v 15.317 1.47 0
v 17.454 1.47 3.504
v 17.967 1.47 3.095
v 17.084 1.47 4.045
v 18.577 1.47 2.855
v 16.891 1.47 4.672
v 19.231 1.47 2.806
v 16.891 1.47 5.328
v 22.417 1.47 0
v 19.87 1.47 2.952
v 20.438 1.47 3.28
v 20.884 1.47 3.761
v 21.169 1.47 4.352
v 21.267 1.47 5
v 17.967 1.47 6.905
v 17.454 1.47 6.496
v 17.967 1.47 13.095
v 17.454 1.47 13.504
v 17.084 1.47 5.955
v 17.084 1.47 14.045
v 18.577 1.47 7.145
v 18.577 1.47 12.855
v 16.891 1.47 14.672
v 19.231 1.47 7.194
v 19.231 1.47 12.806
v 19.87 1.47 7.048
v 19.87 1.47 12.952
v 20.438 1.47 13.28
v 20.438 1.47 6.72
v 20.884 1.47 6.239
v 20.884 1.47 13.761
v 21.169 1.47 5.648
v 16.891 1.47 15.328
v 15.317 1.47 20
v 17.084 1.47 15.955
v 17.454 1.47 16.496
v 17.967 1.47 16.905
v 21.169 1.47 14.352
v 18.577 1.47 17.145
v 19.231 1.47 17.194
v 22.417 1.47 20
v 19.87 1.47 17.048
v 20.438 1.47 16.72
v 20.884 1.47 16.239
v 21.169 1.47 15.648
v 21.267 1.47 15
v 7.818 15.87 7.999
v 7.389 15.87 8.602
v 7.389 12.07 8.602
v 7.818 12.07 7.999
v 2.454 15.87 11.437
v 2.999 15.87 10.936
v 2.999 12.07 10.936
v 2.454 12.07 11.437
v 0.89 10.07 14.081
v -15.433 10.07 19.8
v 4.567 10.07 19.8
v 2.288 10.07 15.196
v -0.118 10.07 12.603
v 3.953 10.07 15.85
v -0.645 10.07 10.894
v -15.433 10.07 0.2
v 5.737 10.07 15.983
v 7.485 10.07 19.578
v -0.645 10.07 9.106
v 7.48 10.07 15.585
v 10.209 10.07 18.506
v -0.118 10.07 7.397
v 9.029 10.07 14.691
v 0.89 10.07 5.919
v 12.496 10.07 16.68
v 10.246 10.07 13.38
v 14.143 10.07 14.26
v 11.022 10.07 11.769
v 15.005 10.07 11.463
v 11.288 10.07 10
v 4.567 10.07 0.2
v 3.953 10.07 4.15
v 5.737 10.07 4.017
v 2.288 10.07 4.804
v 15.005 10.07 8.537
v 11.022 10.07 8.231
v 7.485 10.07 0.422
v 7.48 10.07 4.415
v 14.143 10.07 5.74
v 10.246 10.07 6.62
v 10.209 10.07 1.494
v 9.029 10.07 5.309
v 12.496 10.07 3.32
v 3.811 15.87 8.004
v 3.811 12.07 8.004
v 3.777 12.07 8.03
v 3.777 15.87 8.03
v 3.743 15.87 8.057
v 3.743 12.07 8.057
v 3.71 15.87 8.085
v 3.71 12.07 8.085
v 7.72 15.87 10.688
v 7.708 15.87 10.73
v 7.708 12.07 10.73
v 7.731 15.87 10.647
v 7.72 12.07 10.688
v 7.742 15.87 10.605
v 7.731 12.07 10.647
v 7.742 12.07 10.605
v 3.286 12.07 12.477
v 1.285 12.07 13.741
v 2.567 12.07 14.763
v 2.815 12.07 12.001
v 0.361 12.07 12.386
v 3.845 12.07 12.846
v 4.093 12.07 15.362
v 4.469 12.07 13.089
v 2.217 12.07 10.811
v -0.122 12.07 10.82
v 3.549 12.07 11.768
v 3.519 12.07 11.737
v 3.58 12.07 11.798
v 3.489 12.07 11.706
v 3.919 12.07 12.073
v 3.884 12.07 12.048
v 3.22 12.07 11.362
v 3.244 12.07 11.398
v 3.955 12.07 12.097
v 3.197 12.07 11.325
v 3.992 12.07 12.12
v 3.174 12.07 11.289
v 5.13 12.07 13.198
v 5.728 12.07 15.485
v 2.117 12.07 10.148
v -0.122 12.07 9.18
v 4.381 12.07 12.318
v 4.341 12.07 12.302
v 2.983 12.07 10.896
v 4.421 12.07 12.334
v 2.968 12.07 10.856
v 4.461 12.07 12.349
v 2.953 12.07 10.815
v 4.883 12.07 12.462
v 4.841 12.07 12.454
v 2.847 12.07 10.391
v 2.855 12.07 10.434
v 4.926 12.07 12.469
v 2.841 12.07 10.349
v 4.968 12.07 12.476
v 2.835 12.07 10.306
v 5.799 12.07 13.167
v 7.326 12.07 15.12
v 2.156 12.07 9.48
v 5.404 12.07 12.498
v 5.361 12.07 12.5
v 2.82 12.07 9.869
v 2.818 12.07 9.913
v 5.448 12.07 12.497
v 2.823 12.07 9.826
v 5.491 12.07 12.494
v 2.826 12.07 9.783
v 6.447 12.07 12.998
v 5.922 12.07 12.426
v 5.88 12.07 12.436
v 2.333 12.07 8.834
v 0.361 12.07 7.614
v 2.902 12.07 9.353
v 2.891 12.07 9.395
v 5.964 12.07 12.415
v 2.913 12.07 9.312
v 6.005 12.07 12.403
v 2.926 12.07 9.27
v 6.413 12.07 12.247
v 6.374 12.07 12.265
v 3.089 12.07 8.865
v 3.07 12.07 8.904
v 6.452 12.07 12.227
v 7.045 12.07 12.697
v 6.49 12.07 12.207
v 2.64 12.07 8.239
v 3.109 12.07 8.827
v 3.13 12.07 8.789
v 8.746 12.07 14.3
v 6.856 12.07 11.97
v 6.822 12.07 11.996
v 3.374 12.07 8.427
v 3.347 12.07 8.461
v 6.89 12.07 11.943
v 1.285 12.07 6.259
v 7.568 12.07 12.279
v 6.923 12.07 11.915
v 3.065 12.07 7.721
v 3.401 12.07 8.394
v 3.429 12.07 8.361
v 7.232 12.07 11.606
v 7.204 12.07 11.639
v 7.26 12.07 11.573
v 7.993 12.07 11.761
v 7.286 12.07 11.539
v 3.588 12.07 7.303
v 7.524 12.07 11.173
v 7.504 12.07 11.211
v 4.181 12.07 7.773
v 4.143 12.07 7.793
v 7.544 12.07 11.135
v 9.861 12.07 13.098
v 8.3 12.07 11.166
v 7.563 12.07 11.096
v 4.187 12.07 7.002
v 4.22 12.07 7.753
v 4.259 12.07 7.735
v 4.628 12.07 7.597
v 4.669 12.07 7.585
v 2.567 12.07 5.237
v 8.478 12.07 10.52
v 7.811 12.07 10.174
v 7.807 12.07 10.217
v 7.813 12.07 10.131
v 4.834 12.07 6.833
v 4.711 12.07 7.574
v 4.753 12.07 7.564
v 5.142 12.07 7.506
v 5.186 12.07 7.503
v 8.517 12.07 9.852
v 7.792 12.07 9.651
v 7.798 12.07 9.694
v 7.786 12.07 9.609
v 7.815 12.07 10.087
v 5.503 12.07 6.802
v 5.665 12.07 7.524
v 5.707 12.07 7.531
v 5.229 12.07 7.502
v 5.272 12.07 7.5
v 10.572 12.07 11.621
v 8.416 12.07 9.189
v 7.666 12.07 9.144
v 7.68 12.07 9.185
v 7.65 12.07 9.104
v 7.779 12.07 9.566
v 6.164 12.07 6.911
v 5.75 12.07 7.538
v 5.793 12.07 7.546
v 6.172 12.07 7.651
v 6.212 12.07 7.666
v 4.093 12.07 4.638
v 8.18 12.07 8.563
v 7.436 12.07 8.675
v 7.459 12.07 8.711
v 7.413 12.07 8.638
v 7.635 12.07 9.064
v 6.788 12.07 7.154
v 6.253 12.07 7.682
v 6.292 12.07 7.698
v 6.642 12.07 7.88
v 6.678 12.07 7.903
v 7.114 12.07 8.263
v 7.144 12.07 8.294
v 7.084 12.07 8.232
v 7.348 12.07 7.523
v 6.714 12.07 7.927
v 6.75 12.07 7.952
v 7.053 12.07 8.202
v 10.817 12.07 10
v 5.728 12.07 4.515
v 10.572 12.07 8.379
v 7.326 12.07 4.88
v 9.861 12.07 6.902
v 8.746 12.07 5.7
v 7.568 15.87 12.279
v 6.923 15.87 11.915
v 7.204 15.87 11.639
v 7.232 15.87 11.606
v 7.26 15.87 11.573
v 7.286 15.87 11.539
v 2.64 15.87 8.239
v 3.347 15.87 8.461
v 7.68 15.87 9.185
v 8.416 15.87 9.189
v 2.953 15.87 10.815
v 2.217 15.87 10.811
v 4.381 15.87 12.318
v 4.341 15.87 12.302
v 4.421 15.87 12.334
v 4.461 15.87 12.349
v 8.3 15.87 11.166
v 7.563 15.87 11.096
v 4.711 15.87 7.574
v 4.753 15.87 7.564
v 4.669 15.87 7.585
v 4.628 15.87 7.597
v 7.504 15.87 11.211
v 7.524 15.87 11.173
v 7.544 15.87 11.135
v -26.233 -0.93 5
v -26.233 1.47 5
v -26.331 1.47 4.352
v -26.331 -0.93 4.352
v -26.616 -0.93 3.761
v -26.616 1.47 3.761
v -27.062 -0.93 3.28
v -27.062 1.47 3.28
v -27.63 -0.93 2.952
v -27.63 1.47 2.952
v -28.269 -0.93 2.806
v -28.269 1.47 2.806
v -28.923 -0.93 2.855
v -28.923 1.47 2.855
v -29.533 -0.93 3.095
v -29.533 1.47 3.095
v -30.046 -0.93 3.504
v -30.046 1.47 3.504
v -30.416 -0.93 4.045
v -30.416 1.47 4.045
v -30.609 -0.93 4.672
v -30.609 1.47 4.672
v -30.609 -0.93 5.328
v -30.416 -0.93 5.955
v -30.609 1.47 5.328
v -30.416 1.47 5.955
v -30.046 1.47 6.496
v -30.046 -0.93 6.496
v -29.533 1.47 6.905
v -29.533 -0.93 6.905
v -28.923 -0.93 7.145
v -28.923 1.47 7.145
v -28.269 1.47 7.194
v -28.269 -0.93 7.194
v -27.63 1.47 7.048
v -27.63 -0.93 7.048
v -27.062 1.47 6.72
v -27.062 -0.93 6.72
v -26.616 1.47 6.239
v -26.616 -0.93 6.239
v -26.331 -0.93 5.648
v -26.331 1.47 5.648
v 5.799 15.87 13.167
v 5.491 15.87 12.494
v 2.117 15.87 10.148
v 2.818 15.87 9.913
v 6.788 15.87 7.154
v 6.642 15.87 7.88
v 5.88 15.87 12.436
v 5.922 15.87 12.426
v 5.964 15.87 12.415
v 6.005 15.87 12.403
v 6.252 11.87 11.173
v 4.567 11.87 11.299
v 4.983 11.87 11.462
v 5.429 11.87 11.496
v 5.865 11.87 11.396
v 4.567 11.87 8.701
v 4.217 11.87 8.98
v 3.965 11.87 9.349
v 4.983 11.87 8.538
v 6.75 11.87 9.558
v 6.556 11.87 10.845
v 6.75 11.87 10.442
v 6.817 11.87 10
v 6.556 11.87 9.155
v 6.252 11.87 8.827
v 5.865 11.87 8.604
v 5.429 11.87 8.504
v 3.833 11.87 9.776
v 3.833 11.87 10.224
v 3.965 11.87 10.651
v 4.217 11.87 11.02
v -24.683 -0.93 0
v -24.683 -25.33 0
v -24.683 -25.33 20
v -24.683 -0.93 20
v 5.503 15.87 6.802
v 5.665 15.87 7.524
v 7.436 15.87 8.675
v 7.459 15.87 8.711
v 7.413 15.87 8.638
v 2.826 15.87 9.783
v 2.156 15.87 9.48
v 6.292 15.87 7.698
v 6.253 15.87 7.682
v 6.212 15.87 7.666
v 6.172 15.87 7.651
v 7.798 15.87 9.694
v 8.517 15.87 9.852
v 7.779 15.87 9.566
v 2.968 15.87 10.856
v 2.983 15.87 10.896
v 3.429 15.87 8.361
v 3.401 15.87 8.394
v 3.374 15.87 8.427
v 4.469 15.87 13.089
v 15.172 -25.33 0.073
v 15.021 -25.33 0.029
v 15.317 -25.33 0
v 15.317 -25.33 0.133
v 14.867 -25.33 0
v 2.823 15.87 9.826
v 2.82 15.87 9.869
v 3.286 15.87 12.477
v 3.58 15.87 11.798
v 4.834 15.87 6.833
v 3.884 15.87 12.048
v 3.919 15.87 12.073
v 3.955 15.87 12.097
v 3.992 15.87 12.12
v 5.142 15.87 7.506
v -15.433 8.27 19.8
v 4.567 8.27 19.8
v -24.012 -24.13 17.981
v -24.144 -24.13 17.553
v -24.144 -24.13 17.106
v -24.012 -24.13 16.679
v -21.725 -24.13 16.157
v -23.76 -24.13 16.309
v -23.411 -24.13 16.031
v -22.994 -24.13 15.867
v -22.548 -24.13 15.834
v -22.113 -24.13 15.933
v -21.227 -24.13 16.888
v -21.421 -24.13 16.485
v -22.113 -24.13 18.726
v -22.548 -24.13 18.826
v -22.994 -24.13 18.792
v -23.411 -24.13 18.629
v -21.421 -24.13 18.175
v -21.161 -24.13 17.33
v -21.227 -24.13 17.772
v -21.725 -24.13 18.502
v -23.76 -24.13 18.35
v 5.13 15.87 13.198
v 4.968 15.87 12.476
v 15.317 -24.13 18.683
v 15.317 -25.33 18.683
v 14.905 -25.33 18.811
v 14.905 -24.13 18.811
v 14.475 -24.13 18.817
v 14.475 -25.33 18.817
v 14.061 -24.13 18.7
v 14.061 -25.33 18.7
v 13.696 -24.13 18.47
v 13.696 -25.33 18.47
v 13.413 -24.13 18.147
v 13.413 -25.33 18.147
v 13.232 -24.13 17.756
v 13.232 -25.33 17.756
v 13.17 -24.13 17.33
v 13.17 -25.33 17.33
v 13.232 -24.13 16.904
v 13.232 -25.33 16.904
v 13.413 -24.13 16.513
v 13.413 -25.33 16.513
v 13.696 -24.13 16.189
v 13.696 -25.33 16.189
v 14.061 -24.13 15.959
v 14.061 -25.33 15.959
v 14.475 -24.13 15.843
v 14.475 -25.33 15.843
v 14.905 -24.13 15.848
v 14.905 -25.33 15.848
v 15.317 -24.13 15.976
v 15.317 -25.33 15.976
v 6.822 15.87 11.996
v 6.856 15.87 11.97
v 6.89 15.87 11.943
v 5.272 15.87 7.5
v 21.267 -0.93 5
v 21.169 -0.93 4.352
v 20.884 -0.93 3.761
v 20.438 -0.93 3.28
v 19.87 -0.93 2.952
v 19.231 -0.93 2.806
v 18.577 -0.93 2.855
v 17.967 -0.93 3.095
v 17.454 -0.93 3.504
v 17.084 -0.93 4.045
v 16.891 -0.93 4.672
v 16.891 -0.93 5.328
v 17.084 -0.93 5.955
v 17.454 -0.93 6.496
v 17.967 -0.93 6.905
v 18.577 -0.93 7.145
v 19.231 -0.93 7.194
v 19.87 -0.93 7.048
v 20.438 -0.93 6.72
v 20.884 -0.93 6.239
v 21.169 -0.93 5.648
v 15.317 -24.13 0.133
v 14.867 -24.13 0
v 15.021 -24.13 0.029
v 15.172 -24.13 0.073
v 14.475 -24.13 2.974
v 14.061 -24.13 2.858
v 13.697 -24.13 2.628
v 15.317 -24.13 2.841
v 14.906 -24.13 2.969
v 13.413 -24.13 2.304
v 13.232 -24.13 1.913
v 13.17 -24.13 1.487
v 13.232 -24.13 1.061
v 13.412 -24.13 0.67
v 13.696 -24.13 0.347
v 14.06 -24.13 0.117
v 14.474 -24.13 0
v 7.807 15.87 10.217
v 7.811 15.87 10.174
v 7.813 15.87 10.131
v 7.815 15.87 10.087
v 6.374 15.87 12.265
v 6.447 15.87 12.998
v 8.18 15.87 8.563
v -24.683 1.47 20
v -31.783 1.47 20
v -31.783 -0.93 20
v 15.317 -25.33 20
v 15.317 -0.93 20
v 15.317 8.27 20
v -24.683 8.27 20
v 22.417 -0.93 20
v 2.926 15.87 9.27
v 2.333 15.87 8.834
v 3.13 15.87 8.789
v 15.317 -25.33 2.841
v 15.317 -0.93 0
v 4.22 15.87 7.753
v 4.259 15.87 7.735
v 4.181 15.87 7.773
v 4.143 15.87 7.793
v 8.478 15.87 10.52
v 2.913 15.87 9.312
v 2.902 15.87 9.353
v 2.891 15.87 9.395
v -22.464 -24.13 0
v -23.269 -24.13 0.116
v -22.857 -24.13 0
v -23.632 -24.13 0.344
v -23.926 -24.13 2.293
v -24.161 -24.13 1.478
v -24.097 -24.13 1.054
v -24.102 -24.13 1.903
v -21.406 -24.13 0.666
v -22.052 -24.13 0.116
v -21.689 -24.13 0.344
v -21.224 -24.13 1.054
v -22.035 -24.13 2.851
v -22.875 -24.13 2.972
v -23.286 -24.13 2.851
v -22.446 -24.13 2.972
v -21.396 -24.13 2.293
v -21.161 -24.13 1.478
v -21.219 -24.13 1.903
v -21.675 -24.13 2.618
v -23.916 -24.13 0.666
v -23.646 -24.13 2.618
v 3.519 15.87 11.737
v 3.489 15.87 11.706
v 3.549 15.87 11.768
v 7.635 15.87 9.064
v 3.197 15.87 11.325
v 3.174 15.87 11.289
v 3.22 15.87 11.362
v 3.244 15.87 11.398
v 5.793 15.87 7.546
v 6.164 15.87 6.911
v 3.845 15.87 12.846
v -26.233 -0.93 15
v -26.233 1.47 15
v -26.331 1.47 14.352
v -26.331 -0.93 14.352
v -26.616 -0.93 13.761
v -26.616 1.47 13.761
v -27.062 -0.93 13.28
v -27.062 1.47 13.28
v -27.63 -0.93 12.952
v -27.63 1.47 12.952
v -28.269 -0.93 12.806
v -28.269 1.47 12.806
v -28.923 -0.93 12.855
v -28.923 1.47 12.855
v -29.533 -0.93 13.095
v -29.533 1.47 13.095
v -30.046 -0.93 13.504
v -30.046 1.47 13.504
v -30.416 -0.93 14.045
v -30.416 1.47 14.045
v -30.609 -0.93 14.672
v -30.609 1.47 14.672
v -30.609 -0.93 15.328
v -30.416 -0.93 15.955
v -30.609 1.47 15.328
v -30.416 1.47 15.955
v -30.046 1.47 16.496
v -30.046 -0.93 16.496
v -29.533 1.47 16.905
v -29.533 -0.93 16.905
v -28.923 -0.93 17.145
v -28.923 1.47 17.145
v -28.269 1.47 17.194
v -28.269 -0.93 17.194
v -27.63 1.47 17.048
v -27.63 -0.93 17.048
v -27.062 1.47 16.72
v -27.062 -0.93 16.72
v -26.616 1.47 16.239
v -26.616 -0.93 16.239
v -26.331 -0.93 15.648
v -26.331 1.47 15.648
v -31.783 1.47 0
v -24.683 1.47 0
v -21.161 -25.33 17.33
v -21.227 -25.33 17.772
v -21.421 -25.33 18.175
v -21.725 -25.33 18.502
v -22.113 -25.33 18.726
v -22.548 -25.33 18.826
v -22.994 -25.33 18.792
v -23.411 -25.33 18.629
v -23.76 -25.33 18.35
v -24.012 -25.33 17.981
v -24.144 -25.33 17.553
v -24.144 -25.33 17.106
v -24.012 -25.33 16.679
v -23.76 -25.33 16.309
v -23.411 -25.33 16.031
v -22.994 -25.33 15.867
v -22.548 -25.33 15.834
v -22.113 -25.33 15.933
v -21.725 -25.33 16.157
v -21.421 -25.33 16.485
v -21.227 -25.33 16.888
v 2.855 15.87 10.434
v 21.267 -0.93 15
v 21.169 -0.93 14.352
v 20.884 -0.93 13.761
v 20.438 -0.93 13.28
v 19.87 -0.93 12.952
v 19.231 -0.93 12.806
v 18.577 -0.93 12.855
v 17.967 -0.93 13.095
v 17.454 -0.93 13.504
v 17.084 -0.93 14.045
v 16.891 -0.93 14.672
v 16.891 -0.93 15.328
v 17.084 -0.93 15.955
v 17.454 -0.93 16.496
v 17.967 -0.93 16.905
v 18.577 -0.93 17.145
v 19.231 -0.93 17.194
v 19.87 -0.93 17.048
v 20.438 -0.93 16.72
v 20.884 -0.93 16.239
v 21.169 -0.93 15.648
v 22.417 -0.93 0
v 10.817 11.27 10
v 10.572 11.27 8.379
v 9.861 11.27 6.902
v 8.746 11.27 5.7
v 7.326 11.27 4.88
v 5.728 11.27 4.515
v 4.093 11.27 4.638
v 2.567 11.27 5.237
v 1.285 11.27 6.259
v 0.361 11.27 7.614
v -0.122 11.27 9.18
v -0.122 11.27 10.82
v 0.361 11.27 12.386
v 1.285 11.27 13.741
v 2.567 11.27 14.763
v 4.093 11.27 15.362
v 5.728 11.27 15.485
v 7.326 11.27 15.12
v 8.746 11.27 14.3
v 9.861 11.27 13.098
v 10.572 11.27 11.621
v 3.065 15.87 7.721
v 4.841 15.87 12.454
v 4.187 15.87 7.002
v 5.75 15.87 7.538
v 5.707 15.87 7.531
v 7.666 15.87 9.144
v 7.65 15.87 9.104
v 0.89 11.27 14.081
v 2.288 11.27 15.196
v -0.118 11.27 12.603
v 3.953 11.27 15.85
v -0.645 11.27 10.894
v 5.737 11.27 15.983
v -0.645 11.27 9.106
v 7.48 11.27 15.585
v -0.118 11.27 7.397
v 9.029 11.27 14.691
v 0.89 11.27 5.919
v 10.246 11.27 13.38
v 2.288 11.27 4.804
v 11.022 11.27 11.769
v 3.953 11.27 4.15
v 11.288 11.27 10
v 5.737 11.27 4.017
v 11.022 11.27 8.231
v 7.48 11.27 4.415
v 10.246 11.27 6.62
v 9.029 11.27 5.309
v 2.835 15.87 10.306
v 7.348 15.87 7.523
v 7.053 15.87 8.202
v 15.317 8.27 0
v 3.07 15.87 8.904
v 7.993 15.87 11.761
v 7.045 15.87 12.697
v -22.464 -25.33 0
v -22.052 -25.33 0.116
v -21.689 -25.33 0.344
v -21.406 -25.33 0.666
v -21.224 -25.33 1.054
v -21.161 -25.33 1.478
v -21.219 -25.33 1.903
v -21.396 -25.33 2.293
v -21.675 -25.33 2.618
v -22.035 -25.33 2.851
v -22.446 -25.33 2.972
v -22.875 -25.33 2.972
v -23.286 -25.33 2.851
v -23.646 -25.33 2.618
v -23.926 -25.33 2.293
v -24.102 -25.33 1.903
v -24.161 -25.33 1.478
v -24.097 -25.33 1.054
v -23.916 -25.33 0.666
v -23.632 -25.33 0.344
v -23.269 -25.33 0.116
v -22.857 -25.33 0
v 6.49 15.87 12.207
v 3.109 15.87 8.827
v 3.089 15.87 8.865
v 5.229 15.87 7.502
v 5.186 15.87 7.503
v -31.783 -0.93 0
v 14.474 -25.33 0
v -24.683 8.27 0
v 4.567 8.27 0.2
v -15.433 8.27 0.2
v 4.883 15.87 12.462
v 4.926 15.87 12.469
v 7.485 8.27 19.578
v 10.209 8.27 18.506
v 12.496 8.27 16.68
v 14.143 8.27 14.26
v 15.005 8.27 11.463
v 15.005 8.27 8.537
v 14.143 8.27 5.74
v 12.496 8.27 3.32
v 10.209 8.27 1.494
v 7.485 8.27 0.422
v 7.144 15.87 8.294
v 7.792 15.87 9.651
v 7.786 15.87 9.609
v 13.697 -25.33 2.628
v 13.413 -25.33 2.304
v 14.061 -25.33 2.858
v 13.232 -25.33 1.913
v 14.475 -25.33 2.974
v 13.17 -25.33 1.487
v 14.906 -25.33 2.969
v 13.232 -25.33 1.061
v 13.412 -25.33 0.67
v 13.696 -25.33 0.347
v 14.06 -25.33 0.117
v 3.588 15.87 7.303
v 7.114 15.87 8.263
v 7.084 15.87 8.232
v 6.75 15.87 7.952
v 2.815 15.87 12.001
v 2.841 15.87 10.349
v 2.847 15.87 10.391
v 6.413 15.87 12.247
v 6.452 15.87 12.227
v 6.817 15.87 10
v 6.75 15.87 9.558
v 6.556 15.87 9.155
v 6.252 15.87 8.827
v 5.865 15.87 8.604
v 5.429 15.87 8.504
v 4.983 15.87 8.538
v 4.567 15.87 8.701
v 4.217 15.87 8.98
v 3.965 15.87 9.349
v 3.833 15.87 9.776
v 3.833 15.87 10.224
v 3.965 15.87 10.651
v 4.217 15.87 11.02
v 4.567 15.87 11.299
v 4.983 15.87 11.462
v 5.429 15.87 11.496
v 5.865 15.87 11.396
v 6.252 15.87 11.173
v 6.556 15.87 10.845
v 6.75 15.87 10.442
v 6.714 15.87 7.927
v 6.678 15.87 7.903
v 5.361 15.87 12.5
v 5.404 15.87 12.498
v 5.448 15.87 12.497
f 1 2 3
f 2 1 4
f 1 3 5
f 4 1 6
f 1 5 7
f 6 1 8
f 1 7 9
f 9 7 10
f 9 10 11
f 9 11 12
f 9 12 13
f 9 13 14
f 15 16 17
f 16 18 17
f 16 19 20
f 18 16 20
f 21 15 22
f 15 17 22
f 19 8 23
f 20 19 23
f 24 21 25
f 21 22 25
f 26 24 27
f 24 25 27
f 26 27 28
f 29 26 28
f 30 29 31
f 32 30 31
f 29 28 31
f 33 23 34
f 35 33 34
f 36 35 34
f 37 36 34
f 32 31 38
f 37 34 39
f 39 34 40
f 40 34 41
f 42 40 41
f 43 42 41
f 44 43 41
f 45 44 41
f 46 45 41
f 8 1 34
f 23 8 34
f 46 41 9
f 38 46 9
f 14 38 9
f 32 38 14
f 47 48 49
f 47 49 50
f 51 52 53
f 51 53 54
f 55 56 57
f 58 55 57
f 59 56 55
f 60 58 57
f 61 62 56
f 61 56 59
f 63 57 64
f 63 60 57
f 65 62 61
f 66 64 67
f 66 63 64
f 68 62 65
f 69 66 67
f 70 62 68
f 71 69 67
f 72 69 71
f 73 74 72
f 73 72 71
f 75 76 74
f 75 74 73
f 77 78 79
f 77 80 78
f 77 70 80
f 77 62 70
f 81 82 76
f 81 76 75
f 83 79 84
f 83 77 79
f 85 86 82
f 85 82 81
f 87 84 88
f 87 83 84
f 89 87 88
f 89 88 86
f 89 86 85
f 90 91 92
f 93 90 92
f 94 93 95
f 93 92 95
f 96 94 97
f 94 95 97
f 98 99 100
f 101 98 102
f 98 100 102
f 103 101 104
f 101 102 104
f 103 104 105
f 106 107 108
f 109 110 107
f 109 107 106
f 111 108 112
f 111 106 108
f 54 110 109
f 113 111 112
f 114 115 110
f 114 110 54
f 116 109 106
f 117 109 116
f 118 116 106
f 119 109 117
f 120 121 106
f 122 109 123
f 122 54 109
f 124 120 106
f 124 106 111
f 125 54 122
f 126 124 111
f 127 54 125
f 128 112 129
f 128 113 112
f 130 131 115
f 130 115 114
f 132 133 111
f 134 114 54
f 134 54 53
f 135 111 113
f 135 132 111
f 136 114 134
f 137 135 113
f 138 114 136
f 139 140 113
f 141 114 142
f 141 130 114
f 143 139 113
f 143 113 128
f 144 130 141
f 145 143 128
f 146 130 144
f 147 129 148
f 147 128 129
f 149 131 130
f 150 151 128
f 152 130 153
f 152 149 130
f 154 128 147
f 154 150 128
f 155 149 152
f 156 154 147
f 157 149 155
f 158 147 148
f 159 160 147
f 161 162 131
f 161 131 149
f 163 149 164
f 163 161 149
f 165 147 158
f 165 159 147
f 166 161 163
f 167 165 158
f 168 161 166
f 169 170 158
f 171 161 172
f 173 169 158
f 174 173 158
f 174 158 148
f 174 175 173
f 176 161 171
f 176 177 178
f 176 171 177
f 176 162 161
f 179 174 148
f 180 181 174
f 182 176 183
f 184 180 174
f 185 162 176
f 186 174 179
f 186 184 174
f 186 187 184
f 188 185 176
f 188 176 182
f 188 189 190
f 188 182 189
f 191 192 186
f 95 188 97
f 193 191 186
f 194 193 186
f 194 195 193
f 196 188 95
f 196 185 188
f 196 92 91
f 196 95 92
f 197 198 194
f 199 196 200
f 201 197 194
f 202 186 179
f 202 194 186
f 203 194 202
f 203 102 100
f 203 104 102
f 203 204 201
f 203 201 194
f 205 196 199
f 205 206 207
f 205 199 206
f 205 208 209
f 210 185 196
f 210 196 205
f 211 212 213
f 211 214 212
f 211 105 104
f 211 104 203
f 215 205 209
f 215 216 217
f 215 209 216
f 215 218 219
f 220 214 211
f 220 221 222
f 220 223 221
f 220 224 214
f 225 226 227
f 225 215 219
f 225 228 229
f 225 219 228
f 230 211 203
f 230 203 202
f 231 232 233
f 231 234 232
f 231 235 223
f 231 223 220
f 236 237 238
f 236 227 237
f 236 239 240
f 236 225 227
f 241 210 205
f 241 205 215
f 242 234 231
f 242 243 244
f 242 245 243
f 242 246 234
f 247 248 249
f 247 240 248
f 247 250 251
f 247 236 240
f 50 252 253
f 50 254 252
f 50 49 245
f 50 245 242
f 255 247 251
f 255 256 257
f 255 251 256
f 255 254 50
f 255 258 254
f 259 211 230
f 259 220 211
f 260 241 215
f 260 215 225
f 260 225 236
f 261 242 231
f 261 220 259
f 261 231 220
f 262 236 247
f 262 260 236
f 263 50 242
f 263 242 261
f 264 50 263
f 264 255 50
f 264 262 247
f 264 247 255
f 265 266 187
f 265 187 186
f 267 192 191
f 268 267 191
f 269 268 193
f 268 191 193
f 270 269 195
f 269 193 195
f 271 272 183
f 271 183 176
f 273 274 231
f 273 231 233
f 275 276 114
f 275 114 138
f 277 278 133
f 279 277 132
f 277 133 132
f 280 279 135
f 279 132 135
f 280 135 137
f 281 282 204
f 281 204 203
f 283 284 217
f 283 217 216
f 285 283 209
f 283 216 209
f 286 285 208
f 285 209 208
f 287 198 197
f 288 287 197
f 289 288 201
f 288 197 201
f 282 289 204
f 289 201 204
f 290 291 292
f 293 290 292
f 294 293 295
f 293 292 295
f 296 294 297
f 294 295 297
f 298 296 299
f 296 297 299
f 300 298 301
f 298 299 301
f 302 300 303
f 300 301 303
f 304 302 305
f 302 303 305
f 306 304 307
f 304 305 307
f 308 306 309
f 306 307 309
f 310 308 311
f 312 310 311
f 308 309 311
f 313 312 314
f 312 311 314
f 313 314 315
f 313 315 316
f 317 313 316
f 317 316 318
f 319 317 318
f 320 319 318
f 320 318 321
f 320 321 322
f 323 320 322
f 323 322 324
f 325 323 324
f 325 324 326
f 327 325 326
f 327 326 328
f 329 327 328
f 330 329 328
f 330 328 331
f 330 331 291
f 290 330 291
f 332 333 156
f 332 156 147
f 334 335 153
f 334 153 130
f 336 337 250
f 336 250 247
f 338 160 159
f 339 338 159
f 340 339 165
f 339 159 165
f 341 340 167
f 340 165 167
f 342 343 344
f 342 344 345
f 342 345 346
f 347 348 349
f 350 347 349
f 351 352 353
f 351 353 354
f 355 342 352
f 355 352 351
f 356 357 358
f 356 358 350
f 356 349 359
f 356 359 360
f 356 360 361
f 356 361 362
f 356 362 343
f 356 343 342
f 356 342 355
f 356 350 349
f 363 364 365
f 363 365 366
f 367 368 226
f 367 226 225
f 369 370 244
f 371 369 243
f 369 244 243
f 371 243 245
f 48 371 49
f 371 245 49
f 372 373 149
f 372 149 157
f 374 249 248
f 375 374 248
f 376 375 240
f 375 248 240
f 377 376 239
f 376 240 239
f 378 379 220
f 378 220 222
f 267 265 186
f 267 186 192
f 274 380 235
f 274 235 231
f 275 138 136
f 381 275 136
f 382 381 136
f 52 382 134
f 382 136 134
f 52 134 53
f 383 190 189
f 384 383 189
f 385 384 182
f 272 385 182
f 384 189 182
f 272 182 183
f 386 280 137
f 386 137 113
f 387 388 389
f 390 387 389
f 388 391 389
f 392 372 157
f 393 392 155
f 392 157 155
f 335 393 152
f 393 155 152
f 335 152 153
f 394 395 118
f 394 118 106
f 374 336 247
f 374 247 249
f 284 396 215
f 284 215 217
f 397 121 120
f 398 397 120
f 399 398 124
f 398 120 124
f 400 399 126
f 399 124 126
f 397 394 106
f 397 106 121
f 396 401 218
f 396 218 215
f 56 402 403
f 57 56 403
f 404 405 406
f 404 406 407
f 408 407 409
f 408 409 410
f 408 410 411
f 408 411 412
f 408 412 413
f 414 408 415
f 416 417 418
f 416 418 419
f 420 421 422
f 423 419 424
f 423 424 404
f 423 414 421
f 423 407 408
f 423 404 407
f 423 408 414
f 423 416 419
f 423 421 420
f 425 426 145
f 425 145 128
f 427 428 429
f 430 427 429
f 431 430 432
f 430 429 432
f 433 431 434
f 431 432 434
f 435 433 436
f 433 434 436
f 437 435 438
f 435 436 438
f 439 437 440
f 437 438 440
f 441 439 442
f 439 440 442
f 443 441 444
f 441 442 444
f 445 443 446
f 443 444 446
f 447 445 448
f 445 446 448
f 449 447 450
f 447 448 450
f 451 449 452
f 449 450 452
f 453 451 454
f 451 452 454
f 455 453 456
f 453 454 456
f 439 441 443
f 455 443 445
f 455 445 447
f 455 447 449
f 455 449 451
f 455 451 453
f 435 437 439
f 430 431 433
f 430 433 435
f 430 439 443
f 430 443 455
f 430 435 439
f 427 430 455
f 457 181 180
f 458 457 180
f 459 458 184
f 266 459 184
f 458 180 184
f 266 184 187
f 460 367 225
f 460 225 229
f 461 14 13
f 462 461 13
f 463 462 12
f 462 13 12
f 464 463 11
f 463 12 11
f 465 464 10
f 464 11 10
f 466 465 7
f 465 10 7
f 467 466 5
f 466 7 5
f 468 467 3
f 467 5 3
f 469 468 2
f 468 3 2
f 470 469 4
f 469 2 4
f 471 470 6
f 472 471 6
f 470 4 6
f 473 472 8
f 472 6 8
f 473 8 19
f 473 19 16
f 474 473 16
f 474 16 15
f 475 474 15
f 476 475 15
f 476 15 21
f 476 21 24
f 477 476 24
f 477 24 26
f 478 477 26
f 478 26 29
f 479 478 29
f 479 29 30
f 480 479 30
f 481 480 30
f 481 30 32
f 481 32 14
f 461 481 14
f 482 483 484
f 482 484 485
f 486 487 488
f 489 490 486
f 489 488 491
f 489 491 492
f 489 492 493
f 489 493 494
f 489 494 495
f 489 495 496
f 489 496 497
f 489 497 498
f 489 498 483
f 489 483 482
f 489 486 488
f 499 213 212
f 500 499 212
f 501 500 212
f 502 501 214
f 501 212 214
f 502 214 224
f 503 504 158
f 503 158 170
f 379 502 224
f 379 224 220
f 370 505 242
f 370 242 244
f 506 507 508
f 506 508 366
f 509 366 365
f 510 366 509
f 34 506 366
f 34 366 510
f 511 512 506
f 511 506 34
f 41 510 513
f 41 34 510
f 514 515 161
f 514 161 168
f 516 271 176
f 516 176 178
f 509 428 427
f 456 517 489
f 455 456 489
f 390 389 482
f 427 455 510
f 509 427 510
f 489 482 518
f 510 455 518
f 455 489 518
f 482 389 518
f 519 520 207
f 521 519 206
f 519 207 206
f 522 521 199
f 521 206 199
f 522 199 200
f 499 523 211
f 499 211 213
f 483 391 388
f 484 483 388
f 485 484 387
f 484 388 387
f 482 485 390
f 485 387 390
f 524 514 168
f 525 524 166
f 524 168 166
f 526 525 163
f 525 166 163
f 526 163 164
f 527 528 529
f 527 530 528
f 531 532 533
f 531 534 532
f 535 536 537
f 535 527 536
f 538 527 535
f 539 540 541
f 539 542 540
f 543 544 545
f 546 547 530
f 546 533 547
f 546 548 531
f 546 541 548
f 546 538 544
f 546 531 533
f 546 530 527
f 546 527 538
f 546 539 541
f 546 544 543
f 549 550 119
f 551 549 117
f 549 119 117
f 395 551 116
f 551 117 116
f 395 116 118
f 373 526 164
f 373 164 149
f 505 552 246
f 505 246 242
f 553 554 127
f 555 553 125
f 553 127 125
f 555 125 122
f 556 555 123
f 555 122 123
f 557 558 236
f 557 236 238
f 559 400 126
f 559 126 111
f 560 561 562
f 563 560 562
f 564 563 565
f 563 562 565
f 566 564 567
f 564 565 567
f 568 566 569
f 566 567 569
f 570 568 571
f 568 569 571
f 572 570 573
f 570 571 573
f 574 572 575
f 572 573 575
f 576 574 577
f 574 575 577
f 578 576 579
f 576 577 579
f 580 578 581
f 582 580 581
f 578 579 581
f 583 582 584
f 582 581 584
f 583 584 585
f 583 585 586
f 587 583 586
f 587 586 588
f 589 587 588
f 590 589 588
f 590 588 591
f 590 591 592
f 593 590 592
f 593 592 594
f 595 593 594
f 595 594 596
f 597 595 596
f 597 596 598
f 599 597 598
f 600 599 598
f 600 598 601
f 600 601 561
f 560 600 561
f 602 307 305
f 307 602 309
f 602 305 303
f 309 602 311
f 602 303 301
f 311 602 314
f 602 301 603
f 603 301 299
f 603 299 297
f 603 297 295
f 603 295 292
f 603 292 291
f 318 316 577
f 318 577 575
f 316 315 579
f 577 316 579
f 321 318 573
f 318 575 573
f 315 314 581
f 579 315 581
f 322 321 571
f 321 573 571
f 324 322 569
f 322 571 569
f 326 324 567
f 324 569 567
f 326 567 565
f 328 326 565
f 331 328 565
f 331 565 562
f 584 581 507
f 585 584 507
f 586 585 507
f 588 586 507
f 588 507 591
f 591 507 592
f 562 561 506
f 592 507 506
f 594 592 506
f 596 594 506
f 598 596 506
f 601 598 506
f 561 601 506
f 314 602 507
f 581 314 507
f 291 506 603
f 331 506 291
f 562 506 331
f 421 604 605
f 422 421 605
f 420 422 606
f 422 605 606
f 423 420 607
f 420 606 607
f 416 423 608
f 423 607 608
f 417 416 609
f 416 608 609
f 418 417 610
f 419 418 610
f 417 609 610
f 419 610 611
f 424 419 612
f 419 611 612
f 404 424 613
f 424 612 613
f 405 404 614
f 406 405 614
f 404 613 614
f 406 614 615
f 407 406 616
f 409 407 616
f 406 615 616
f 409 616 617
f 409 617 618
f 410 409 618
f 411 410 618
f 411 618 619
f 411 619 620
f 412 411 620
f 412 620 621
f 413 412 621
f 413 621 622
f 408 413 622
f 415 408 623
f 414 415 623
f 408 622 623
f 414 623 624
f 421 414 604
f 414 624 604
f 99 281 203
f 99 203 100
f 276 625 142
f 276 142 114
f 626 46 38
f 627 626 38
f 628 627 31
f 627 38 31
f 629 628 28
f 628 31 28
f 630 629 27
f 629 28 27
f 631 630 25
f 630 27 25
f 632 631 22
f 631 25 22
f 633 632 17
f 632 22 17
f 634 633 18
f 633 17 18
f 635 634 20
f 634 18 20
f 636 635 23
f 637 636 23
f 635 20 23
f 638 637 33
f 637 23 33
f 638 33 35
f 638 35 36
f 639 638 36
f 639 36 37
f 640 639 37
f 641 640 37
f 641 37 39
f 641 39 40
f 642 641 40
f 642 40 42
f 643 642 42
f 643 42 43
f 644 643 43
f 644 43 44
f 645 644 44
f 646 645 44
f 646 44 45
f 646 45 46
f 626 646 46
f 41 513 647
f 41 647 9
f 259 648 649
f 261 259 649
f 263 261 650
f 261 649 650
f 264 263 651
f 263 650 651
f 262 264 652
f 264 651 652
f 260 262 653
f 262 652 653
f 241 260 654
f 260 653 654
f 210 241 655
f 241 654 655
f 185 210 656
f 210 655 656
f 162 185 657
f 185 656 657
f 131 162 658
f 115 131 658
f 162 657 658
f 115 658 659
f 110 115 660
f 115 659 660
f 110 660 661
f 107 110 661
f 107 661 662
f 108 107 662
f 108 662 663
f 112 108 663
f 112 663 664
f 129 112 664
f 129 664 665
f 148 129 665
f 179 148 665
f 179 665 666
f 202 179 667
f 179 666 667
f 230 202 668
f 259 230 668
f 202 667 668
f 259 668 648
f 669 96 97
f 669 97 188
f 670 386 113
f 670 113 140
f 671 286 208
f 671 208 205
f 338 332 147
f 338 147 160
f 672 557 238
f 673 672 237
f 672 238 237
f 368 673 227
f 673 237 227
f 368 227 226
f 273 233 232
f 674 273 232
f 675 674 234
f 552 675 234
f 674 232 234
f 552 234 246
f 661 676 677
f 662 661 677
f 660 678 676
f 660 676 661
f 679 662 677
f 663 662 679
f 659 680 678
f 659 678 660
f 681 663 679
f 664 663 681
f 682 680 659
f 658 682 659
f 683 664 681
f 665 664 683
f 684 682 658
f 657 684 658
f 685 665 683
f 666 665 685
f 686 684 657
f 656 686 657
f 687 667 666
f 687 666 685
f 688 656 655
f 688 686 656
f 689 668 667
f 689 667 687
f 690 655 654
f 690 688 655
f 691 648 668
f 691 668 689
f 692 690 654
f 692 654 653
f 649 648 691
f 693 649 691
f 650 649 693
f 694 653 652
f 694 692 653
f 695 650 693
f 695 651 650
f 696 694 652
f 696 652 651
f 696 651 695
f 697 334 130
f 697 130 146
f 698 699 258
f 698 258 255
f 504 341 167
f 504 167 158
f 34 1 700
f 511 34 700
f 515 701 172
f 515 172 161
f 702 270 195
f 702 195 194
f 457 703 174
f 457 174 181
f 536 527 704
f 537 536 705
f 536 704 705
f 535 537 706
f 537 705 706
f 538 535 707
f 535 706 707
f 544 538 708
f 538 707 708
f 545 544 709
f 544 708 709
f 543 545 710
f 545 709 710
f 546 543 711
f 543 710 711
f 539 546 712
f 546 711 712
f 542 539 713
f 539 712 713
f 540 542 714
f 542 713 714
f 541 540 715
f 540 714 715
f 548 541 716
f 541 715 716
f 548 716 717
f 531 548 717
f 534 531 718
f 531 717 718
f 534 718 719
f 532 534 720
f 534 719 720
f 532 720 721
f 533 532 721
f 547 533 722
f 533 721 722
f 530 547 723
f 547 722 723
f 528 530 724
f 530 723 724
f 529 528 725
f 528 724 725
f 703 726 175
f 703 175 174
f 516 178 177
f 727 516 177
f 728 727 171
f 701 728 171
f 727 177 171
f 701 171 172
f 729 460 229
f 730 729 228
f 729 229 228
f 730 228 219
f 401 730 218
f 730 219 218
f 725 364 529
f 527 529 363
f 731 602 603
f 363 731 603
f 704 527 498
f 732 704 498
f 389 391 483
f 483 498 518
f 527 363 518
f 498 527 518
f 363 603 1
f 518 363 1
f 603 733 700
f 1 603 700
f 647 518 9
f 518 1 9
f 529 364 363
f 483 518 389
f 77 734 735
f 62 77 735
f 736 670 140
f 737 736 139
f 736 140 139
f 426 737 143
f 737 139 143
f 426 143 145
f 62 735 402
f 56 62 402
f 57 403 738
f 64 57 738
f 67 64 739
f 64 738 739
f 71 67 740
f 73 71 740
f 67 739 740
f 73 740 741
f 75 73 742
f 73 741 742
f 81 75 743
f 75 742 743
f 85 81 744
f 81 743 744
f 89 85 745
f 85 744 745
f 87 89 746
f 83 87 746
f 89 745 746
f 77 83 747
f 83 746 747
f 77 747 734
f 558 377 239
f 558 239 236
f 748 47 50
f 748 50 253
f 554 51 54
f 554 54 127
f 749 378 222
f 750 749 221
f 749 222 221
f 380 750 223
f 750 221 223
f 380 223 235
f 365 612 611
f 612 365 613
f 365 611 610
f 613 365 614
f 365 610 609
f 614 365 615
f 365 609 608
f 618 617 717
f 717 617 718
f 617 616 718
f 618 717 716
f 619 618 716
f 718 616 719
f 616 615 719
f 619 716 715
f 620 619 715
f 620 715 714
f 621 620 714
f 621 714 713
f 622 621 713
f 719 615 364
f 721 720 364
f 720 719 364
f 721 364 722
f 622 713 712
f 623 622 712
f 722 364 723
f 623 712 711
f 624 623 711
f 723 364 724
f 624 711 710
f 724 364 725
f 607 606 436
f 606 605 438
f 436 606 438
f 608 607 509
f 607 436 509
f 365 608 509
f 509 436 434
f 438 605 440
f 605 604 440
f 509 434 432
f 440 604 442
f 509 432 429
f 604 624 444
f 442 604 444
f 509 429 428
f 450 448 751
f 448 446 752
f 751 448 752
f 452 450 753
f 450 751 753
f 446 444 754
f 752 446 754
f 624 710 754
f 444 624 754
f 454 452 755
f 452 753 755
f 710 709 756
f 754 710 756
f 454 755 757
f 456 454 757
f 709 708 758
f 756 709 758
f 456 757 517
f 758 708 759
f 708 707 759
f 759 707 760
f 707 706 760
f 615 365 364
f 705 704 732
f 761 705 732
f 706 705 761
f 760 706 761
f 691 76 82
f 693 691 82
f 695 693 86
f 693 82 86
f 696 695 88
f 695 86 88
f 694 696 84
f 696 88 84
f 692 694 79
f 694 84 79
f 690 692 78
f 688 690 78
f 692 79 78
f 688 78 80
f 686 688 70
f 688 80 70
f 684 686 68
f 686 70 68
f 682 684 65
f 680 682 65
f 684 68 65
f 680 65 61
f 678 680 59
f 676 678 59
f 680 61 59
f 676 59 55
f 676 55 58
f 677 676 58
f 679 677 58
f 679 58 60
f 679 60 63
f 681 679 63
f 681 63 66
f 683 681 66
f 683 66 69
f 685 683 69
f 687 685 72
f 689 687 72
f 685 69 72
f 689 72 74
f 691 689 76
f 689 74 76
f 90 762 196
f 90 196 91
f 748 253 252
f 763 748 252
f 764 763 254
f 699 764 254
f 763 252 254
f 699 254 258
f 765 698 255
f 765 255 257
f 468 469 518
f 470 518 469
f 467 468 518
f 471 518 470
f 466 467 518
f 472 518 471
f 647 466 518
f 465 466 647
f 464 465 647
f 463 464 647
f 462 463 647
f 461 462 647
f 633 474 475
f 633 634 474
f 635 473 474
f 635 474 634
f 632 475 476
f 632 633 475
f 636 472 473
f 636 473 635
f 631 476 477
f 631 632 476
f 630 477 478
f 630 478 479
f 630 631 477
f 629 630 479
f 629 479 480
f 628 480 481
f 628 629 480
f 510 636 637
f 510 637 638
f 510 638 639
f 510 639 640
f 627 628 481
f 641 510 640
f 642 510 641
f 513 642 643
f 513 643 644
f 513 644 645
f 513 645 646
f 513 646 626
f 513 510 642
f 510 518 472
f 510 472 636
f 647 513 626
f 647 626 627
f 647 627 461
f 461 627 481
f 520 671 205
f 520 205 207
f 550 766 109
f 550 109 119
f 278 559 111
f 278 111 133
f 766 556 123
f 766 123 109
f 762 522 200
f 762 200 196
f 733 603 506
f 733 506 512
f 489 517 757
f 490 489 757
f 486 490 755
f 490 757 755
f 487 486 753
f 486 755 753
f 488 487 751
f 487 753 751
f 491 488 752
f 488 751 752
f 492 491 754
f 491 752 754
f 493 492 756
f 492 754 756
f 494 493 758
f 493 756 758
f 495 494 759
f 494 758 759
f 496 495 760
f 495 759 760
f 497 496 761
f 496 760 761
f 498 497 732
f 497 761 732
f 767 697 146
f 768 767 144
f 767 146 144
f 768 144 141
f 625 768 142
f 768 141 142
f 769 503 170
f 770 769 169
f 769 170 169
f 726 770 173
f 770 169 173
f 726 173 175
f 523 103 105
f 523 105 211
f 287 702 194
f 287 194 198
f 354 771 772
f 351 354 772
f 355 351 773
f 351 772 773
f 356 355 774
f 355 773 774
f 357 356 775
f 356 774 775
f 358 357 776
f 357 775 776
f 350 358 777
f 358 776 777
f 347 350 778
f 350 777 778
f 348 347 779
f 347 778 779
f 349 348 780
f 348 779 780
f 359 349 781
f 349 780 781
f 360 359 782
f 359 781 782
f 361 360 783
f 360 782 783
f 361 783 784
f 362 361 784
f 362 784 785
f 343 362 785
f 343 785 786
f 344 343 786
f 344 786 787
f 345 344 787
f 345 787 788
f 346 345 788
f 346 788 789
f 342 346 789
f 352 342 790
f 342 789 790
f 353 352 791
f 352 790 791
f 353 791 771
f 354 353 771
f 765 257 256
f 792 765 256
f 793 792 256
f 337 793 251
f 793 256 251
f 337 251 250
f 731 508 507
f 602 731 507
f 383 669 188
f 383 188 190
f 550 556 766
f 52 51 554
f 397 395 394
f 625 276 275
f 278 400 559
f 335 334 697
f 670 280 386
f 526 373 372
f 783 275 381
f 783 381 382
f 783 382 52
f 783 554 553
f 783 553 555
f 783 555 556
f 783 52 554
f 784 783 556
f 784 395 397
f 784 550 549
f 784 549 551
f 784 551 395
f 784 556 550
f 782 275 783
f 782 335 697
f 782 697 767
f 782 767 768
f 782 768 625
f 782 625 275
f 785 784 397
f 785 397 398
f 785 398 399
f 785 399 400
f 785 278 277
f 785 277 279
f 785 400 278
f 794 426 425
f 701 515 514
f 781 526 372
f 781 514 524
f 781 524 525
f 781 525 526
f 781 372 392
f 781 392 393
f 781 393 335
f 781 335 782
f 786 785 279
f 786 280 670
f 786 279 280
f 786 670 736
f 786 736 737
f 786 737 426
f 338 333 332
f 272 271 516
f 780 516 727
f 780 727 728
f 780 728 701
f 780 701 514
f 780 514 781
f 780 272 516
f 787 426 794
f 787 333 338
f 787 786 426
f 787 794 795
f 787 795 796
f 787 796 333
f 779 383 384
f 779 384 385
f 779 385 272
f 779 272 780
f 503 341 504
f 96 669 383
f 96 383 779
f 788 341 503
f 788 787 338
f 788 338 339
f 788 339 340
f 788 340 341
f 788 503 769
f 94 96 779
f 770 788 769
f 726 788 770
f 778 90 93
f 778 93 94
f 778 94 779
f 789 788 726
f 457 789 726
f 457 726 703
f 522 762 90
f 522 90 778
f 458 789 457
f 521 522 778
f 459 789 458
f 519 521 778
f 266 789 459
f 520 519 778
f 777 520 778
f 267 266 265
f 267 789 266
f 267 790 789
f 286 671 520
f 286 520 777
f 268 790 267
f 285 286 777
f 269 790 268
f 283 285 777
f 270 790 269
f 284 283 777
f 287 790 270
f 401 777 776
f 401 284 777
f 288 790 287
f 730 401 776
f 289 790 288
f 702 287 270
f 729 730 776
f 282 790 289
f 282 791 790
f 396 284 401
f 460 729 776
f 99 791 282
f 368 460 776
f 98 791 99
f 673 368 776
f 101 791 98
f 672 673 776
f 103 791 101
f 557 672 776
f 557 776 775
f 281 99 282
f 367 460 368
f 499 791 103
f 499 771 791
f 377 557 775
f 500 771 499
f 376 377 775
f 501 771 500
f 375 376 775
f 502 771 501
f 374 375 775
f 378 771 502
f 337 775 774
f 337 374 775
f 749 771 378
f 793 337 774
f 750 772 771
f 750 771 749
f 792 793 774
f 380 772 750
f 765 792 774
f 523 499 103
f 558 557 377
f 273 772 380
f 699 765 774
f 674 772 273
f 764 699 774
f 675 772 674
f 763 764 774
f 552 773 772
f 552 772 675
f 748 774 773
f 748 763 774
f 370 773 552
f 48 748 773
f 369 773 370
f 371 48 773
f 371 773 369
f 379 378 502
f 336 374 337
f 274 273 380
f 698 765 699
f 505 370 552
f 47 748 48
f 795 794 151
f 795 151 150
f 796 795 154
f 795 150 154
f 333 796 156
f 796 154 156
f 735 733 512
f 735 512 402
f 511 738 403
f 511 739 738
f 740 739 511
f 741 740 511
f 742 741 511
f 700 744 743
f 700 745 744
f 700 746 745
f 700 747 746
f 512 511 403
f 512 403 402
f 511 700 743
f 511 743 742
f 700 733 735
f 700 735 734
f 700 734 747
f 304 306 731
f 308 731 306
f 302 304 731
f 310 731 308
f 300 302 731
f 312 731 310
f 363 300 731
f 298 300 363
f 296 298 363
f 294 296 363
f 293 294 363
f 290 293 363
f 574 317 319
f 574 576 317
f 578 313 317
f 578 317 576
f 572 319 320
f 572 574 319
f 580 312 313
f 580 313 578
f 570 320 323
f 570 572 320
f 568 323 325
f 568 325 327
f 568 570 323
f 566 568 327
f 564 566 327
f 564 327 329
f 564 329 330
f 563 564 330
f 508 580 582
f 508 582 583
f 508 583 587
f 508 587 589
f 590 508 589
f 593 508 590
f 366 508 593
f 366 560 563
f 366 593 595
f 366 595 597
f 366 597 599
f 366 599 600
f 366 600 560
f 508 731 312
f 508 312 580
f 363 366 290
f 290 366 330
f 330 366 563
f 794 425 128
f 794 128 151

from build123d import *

# Parameters (mm, degrees)
SKETCH1_W           = 40
SKETCH1_H           = 33.6
BOSS_EXTRUDE1_DEPTH = 20
SKETCH2_W           = 7.1
SKETCH2_H           = 2.4
BOSS_EXTRUDE2_DEPTH = 20
SKETCH4_R           = 2.2
CUT_EXTRUDE1_DEPTH  = 3
BOSS_EXTRUDE4_DEPTH = 1.8
SKETCH6_R           = 1.5
CUT_EXTRUDE2_DEPTH  = 1.2
SKETCH7_R           = 6
BOSS_EXTRUDE5_DEPTH = 1.2
SKETCH8_R           = 5.5
BOSS_EXTRUDE6_DEPTH = 0.8
SKETCH10_R          = 2.5
BOSS_EXTRUDE8_DEPTH = 3.8
BOSS_EXTRUDE9_DEPTH = 4
CIRPATTERN2_COUNT   = 30
SKETCH12_R          = 1.5
CUT_EXTRUDE4_DEPTH  = 4


with BuildPart() as part:
    # Sketch1 → Boss-Extrude1 (new body)
    with BuildSketch(Plane.XY):
        with Locations((-4.683412042, -8.529571984)):
            Rectangle(SKETCH1_W, SKETCH1_H)
    extrude(amount=BOSS_EXTRUDE1_DEPTH)

    # Sketch2 → Boss-Extrude2 (add)
    with BuildSketch(Plane.XY.offset(20)):
        with Locations((18.866587958, 0.270428016)):
            Rectangle(SKETCH2_W, SKETCH2_H)
        with Locations((-28.233412042, 0.270428016)):
            Rectangle(SKETCH2_W, SKETCH2_H)
    extrude(amount=-BOSS_EXTRUDE2_DEPTH)

    # Sketch4 → Cut-Extrude1 (cut)
    with BuildSketch(Plane(origin=(0, 1.470428016, 0), x_dir=(1, 0, 0), z_dir=(0, 1, 0))):
        with Locations((19.066587958, -15)):
            Circle(SKETCH4_R)
        with Locations((19.066587958, -5)):
            Circle(SKETCH4_R)
        with Locations((-28.433412042, -15)):
            Circle(SKETCH4_R)
        with Locations((-28.433412042, -5)):
            Circle(SKETCH4_R)
    extrude(amount=-CUT_EXTRUDE1_DEPTH, mode=Mode.SUBTRACT)

    # Sketch5 → Boss-Extrude4 (add)
    with BuildSketch(Plane(origin=(0, 8.270428016, 0), x_dir=(1, 0, 0), z_dir=(0, 1, 0))):
        with BuildLine():
            Line((-15.433412042, -0.2), (-15.433412042, -19.8))
            Line((-15.433412042, -19.8), (4.566587958, -19.8))
            ThreePointArc((4.566587958, -19.8), (15.11483144, -10), (4.566587958, -0.2))
            Line((4.566587958, -0.2), (-15.433412042, -0.2))
        make_face()
    extrude(amount=BOSS_EXTRUDE4_DEPTH)

    # Sketch6 → Cut-Extrude2 (cut)
    with BuildSketch(Plane.XZ.offset(25.329571984)):
        with Locations((-22.660585011, 17.329722527)):
            Circle(SKETCH6_R)
        with Locations((-22.660585011, 1.487126069)):
            Circle(SKETCH6_R)
        with Locations((14.670467636, 17.329722527)):
            Circle(SKETCH6_R)
        with Locations((14.670467636, 1.487126069)):
            Circle(SKETCH6_R)
    extrude(amount=-CUT_EXTRUDE2_DEPTH, mode=Mode.SUBTRACT)

    # Sketch7 → Boss-Extrude5 (add)
    with BuildSketch(Plane(origin=(0, 10.070428016, 0), x_dir=(1, 0, 0), z_dir=(0, 1, 0))):
        with Locations((5.288292978, -10)):
            Circle(SKETCH7_R)
    extrude(amount=BOSS_EXTRUDE5_DEPTH)

    # Sketch8 → Boss-Extrude6 (add)
    with BuildSketch(Plane(origin=(0, 11.270428016, 0), x_dir=(1, 0, 0), z_dir=(0, 1, 0))):
        with Locations((5.316587958, -10)):
            Circle(SKETCH8_R)
    extrude(amount=BOSS_EXTRUDE6_DEPTH)

    # Sketch10 → Boss-Extrude8 (add)
    with BuildSketch(Plane(origin=(0, 12.070428016, 0), x_dir=(1, 0, 0), z_dir=(0, 1, 0))):
        with Locations((5.316587958, -10)):
            Circle(SKETCH10_R)
    extrude(amount=BOSS_EXTRUDE8_DEPTH)

    # Sketch11 → Boss-Extrude9 (add)
    with BuildSketch(Plane(origin=(0, 15.870428016, 0), x_dir=(1, 0, 0), z_dir=(0, 1, 0))):
        Polygon((5.503448723, -6.801928291), (5.271899273, -7.500399448), (5.664716985, -7.524357421), align=None)
    boss_extrude9 = extrude(amount=-BOSS_EXTRUDE9_DEPTH)

    # CirPattern2: Boss-Extrude9 ×30 about axis
    cirpattern2_axis = Axis((5.316587958, 0, 10), (0, 1, 0))
    for i in range(1, CIRPATTERN2_COUNT):
        add(boss_extrude9.rotate(cirpattern2_axis, i * 360 / CIRPATTERN2_COUNT))

    # Sketch12 → Cut-Extrude4 (cut)
    with BuildSketch(Plane(origin=(0, 15.870428016, 0), x_dir=(1, 0, 0), z_dir=(0, 1, 0))):
        with Locations((5.316587958, -10)):
            Circle(SKETCH12_R)
    extrude(amount=-CUT_EXTRUDE4_DEPTH, mode=Mode.SUBTRACT)


solid = part.part
